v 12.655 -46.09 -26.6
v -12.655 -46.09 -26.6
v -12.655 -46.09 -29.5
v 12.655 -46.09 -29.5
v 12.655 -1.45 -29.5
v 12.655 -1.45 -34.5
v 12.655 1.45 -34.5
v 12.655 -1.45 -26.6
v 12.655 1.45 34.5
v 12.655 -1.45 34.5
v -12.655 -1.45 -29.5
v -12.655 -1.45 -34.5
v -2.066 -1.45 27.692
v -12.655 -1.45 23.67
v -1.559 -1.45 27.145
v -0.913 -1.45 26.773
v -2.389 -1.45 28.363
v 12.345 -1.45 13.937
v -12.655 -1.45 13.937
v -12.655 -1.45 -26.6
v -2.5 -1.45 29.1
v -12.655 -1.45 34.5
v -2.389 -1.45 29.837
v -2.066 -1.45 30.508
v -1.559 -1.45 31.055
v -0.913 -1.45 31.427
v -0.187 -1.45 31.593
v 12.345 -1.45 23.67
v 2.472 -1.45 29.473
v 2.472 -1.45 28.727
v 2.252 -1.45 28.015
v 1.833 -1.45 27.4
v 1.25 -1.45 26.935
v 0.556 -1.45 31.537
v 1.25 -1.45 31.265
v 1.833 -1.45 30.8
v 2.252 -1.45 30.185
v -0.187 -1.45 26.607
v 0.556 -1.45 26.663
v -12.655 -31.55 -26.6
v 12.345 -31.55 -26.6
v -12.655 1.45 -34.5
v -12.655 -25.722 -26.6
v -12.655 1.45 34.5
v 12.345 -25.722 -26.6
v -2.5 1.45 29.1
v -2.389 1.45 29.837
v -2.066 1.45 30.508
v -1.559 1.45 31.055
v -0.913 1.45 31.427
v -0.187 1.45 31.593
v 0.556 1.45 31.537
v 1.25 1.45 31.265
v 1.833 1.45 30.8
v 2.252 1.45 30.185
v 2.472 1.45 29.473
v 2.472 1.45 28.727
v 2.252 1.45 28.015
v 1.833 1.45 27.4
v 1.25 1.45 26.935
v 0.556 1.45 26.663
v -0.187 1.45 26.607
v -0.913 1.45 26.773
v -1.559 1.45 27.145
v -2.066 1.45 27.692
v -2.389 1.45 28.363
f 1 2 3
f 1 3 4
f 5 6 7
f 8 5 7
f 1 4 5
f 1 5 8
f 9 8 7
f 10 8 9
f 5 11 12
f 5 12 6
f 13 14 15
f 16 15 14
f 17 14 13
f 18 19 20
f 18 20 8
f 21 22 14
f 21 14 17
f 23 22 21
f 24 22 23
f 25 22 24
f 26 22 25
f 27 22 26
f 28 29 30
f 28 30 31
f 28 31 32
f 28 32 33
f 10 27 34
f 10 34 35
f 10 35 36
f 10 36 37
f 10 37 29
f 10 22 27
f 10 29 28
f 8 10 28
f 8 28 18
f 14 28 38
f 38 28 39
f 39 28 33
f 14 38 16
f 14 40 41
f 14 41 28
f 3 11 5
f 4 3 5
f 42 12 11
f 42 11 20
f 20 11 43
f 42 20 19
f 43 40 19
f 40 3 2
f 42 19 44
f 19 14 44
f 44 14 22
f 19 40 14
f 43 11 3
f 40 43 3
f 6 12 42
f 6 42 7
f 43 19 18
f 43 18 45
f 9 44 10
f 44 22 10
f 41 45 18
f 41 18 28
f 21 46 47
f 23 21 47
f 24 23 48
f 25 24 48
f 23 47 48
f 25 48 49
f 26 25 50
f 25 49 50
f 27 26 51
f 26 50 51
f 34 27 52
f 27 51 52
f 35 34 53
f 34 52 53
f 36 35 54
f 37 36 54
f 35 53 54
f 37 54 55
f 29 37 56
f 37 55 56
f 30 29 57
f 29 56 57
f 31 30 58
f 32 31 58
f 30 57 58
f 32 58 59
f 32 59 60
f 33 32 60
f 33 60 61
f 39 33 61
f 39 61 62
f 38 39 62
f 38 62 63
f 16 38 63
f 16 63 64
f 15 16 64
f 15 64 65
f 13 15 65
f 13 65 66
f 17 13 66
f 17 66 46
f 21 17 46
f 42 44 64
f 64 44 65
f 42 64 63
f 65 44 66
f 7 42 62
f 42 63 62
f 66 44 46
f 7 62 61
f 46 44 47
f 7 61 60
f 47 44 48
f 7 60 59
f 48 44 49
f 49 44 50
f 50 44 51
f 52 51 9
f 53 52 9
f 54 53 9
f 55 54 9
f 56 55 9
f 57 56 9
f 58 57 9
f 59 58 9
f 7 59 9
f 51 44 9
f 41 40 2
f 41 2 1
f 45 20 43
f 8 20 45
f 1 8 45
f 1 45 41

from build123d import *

# Parameters (mm, degrees)
F0_W     = 25.31
F0_H     = 69
F1_DEPTH = 1.45
F2_W     = 25.31
F2_H     = 2.9
F3_DEPTH = 44.64
F8_DEPTH = 25
F10_D    = 5


with BuildPart() as f1:
    # F0 (on Front) → F1 (new body, symmetric)
    with BuildSketch(Plane.XZ):
        Rectangle(F0_W, F0_H)
    extrude(amount=F1_DEPTH, both=True)

    # F2 (on face) → F3 (join)
    with BuildSketch(Plane.XZ.offset(1.45)):
        with Locations((0, -28.05)):
            Rectangle(F2_W, F2_H)
    extrude(amount=F3_DEPTH)

    # F7 (on line) → F8 (join)
    with BuildSketch(Plane(origin=(-12.655, 0, 0), x_dir=(0, -1, 0), z_dir=(-1, 0, 0))):
        Polygon((25.722218447, -26.6), (31.55, -26.6), (1.45, 23.67), (1.45, 13.9370239645), align=None)
    extrude(amount=-F8_DEPTH)

    # F10 (through all)
    with Locations(Plane.XZ.offset(1.45)):
        with Locations((0, 29.1)):
            Hole(F10_D / 2)


solid = f1.part
